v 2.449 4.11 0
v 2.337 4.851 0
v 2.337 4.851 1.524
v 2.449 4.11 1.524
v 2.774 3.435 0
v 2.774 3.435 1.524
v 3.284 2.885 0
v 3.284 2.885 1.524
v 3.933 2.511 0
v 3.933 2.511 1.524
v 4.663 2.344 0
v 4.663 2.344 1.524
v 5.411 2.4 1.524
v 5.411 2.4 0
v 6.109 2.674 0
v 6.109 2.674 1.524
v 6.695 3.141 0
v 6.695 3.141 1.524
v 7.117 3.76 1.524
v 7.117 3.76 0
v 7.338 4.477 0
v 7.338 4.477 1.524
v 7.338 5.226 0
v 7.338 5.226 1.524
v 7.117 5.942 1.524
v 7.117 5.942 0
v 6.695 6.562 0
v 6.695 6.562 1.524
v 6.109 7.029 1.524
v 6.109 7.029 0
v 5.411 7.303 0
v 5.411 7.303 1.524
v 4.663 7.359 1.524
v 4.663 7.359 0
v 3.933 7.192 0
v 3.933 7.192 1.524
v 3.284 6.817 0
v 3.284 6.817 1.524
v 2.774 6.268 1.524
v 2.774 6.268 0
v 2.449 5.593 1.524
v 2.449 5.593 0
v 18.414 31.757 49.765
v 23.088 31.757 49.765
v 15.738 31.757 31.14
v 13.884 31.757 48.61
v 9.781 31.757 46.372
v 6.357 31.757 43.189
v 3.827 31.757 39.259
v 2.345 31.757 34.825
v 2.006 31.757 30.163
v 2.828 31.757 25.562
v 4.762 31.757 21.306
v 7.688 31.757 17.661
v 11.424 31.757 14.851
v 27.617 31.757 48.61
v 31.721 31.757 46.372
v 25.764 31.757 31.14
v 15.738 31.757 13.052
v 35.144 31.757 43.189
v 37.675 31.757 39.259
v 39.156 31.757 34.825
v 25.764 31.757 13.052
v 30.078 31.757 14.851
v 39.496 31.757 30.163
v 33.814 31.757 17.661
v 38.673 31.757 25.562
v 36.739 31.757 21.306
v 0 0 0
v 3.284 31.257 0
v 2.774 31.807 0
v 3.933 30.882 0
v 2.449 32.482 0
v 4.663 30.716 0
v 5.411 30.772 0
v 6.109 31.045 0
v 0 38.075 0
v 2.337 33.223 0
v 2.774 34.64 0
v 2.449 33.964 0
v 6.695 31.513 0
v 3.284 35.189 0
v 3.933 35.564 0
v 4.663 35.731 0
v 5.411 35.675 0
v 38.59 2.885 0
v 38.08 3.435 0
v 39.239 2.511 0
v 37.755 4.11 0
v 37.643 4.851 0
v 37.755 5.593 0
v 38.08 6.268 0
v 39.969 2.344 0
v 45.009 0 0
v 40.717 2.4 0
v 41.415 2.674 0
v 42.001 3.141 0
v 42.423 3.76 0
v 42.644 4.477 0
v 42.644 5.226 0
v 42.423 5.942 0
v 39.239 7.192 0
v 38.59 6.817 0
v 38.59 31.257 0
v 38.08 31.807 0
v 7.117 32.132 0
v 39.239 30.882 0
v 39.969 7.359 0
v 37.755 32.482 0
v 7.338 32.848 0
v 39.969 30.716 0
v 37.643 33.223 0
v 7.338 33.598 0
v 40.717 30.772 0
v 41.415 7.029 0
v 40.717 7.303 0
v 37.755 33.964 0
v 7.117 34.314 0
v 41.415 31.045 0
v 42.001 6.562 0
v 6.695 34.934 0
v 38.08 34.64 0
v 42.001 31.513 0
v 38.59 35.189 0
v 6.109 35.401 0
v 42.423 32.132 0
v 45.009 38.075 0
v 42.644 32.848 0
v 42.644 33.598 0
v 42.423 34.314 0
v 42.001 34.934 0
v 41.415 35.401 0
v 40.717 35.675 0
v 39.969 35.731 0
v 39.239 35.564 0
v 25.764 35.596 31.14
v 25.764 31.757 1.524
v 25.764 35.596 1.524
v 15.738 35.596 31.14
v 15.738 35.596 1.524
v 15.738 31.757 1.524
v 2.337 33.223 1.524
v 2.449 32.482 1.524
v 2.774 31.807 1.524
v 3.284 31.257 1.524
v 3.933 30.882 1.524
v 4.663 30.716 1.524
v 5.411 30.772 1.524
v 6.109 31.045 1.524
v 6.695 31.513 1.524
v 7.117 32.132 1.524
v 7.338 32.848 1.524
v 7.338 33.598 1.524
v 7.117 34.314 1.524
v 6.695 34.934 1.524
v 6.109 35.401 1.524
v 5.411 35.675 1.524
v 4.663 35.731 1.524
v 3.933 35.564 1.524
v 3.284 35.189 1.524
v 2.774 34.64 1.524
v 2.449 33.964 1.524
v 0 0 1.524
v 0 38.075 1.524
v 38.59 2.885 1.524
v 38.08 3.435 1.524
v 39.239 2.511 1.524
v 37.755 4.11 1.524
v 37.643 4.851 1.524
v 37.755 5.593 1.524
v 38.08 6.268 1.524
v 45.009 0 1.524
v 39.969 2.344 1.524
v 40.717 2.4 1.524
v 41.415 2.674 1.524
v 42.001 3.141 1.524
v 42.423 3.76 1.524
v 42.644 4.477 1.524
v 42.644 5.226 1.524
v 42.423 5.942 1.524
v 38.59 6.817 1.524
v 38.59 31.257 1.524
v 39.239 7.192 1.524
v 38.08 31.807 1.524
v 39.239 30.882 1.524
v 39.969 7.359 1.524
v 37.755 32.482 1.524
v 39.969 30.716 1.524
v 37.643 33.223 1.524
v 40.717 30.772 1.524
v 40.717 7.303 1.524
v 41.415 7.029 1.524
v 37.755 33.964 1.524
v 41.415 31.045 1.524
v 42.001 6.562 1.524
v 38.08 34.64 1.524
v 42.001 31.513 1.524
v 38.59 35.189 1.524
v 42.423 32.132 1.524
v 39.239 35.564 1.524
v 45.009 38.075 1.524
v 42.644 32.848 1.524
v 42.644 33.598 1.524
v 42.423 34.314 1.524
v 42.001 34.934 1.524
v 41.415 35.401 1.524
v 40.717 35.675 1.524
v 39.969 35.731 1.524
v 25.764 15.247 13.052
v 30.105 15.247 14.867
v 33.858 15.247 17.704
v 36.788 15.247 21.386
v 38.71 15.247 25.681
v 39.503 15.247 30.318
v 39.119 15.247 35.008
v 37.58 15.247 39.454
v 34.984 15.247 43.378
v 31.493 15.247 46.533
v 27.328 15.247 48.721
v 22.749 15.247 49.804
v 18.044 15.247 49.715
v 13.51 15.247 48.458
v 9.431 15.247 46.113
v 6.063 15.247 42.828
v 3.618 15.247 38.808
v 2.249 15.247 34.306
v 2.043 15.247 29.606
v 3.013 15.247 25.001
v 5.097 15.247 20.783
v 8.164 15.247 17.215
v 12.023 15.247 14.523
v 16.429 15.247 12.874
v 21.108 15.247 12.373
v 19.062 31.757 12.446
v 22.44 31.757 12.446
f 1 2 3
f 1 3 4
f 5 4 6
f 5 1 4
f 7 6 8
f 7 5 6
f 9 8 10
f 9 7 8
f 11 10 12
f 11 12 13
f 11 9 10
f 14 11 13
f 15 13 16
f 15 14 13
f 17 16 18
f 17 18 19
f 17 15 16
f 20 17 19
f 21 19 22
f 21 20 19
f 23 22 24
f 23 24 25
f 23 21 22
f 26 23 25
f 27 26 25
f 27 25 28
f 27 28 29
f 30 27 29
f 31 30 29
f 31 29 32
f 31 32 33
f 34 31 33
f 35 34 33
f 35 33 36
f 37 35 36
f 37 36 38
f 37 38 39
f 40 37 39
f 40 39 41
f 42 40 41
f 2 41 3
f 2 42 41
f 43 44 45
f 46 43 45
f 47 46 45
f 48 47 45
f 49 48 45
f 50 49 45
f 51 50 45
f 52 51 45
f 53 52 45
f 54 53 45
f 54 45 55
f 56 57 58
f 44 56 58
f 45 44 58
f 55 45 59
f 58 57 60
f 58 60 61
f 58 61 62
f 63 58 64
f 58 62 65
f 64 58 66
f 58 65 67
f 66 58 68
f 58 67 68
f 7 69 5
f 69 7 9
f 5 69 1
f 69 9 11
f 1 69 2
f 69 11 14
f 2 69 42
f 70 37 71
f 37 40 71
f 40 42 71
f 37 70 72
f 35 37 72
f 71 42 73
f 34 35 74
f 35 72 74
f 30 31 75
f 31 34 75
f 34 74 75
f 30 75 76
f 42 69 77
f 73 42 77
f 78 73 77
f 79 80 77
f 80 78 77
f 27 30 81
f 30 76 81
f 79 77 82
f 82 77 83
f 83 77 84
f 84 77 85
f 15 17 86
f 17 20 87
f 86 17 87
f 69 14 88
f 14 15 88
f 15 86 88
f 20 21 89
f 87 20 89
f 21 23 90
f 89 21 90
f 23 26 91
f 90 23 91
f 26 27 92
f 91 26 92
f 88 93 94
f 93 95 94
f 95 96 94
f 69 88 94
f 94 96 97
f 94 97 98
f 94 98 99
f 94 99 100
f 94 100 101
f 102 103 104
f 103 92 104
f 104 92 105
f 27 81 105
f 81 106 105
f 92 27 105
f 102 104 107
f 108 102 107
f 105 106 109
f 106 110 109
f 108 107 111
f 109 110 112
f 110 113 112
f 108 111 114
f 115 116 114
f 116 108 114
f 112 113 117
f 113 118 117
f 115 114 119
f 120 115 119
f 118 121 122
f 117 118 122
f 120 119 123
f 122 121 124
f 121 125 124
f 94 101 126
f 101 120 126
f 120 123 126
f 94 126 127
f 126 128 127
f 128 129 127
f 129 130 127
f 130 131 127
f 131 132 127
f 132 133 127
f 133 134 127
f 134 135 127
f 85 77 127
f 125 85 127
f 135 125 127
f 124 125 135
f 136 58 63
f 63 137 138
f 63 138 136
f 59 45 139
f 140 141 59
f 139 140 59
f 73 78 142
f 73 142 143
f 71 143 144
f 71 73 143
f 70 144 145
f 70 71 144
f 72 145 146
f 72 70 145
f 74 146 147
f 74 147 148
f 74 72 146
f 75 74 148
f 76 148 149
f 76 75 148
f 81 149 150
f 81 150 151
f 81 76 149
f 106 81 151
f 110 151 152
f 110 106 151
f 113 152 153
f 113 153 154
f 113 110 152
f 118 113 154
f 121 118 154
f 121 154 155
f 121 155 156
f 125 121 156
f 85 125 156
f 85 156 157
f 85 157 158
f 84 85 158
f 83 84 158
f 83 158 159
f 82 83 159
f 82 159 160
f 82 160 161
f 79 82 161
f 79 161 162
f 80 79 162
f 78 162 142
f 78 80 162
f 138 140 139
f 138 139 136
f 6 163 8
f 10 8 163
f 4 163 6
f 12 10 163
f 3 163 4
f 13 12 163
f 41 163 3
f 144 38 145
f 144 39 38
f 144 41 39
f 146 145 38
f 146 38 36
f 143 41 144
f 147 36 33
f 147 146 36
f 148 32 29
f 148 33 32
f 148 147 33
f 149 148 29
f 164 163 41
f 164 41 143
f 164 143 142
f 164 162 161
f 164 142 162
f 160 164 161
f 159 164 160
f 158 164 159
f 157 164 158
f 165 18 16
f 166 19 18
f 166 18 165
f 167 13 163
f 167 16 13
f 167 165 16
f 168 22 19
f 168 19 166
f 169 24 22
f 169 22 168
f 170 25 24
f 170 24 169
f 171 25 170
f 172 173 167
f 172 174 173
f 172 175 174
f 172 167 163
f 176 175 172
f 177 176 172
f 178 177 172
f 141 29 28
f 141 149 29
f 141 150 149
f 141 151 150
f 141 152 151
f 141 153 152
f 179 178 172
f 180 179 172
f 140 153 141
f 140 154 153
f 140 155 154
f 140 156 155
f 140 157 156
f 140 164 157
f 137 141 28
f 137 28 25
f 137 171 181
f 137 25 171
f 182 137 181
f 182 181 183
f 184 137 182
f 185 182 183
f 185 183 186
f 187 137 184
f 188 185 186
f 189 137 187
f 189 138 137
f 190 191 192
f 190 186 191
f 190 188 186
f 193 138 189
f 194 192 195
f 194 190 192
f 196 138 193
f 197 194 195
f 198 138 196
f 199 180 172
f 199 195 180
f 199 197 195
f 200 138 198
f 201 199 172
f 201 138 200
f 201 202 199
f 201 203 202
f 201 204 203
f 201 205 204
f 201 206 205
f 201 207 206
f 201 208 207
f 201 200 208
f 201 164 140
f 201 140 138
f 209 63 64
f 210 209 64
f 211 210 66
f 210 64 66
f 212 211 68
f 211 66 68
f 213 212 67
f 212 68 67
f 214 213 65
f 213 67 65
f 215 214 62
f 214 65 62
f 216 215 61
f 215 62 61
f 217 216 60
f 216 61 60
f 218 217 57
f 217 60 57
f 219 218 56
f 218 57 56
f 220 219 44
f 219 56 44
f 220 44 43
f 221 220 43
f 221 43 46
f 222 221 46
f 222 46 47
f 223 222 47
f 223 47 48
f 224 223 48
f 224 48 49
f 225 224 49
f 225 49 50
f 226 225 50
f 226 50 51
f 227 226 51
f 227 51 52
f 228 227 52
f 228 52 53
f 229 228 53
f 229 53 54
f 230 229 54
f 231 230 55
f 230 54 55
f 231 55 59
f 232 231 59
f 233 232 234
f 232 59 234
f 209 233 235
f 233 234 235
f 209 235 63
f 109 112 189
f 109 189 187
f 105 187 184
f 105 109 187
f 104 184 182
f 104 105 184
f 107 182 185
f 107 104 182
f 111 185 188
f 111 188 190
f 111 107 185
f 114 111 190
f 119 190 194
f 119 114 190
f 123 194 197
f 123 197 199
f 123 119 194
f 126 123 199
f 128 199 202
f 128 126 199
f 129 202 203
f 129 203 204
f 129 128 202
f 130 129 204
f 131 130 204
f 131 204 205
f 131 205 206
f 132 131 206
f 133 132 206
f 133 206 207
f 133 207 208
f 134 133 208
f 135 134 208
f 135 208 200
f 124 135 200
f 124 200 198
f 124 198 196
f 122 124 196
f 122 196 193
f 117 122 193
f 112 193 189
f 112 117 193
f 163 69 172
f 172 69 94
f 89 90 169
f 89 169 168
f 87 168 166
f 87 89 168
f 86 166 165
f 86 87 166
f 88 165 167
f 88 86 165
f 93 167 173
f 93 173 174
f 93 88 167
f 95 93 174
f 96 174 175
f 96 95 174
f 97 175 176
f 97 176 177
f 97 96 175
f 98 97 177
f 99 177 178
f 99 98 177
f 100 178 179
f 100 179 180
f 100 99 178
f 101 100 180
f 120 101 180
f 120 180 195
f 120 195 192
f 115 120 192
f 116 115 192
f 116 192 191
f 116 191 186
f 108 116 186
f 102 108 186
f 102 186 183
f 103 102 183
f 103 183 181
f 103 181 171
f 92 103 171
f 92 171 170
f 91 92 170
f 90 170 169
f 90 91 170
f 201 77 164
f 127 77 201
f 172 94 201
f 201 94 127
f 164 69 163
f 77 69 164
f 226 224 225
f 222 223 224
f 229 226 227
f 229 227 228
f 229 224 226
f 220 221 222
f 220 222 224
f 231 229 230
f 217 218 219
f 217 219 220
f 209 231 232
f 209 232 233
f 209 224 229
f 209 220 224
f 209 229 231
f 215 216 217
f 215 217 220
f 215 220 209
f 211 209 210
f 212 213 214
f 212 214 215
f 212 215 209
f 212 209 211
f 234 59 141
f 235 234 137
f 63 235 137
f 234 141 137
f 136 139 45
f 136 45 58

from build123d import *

# Parameters (mm, degrees)
SKETCH2_W           = 45.0088
SKETCH2_H           = 38.0746
SKETCH2_R           = 2.5146
BOSS_EXTRUDE1_DEPTH = 1.524
SKETCH3_W           = 10.026160074
SKETCH3_H           = 3.839196093
BOSS_EXTRUDE2_DEPTH = 29.6164
SKETCH4_R           = 18.7706
BOSS_EXTRUDE3_DEPTH = 16.51


with BuildPart() as part:
    # Sketch2 → Boss-Extrude1 (new body)
    with BuildSketch(Plane.XY):
        with Locations((22.5044, 19.0373)):
            Rectangle(SKETCH2_W, SKETCH2_H)
        with Locations(Location((4.8514, 33.2232, 0), (0, 0, 180))):
            Circle(SKETCH2_R, mode=Mode.SUBTRACT)
        with Locations(Location((4.8514, 4.8514, 0), (0, 0, 180))):
            Circle(SKETCH2_R, mode=Mode.SUBTRACT)
        with Locations(Location((40.1574, 4.8514, 0), (0, 0, 180))):
            Circle(SKETCH2_R, mode=Mode.SUBTRACT)
        with Locations(Location((40.1574, 33.2232, 0), (0, 0, 180))):
            Circle(SKETCH2_R, mode=Mode.SUBTRACT)
    extrude(amount=BOSS_EXTRUDE1_DEPTH)

    # Sketch3 → Boss-Extrude2 (add)
    with BuildSketch(Plane.XY.offset(1.524)):
        with Locations((20.750845866, 33.676355349)):
            Rectangle(SKETCH3_W, SKETCH3_H)
    extrude(amount=BOSS_EXTRUDE2_DEPTH)

    # Sketch4 → Boss-Extrude3 (add)
    with BuildSketch(Plane.XZ.offset(-31.756757303)):
        with Locations(Location((20.750845866, 31.1404, 0), (0, 0, 285.490039243))):
            Circle(SKETCH4_R)
    extrude(amount=BOSS_EXTRUDE3_DEPTH)


solid = part.part
